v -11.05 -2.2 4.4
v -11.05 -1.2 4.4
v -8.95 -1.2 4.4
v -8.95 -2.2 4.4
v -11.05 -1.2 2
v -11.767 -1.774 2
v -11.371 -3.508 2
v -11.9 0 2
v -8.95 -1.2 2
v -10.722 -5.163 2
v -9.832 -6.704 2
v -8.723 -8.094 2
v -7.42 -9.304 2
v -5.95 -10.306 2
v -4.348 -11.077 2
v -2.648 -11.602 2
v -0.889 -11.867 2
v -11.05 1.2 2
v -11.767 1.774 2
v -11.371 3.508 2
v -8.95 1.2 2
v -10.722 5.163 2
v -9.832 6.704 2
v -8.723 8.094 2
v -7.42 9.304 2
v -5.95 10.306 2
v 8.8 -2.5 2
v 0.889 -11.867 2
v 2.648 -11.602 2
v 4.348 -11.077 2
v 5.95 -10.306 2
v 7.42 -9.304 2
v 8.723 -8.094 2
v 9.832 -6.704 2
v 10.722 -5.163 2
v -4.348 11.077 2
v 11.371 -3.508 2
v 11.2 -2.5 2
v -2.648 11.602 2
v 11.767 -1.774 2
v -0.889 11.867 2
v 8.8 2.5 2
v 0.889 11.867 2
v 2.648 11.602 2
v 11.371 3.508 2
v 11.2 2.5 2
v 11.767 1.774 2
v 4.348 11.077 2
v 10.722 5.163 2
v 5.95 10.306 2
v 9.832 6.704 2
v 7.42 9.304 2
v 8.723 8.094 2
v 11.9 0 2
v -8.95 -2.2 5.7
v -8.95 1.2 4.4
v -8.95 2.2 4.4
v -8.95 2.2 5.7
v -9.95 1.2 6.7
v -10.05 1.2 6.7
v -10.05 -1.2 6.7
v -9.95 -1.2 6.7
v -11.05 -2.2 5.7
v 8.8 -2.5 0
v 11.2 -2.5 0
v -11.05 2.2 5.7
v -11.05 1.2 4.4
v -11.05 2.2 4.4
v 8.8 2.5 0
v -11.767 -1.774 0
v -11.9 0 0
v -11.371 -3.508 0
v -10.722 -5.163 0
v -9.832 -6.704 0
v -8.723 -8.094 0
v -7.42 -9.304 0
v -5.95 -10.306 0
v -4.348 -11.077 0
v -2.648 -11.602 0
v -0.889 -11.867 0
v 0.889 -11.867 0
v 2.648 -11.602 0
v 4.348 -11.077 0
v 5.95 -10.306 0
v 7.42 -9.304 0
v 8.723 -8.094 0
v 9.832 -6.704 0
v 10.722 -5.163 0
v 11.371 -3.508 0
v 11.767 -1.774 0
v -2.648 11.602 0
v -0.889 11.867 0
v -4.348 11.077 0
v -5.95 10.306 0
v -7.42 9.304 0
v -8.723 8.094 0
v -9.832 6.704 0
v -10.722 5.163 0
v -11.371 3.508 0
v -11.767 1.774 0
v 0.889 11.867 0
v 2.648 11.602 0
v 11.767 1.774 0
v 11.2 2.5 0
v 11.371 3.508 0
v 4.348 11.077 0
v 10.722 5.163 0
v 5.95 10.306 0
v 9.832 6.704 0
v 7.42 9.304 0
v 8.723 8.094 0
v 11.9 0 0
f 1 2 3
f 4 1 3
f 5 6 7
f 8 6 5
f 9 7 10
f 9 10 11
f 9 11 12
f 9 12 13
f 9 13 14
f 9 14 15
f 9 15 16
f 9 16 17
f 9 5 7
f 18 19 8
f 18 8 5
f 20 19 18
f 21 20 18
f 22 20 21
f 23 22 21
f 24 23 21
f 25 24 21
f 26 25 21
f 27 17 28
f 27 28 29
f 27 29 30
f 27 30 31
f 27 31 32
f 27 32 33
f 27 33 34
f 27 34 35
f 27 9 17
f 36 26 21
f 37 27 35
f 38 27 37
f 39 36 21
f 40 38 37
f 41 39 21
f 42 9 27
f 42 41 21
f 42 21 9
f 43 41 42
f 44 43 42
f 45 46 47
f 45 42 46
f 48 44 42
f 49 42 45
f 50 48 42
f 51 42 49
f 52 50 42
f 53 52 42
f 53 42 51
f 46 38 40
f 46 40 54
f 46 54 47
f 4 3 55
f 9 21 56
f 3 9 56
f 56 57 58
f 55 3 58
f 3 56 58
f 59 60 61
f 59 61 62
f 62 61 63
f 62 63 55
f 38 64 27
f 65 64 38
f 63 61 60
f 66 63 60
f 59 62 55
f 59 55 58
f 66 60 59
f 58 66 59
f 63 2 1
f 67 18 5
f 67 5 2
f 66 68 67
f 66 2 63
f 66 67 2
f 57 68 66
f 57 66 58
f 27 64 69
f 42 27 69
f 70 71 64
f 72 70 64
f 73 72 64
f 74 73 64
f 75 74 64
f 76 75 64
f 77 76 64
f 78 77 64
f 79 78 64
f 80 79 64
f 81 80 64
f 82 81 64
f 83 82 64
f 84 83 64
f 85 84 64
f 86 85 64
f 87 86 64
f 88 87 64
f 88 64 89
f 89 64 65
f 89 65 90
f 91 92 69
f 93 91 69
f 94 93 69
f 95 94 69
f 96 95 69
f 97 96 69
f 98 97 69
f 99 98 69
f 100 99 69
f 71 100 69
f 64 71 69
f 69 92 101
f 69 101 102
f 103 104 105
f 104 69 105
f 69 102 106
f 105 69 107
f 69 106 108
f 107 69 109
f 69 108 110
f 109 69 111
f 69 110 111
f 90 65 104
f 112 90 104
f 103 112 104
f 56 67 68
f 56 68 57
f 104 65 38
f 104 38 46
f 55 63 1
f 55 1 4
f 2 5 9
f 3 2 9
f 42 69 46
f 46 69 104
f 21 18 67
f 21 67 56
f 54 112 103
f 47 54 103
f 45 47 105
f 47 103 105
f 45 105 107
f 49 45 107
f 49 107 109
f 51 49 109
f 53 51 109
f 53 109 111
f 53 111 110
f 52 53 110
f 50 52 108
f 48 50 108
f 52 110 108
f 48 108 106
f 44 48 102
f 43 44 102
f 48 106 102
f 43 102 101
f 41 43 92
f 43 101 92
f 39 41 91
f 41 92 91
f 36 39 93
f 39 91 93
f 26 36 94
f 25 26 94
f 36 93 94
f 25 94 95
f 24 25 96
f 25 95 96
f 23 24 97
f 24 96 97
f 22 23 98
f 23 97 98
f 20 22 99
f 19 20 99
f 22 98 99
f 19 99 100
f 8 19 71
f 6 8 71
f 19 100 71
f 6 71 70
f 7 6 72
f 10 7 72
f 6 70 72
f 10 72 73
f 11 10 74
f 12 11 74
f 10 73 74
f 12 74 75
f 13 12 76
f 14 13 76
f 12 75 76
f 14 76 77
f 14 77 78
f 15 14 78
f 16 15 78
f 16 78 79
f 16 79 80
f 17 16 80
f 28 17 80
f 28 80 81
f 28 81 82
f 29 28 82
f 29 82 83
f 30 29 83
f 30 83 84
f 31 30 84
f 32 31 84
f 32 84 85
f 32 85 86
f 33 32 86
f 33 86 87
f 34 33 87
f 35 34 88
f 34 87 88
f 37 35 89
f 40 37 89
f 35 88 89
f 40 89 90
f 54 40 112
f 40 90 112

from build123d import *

# Parameters (mm, degrees)
SKETCH1_R           = 11.9
SKETCH1_W           = 2.4
SKETCH1_H           = 5
BOSS_EXTRUDE2_DEPTH = 2
SKETCH2_W           = 2.1
SKETCH2_H           = 2.4
BOSS_EXTRUDE3_DEPTH = 4.7
SKETCH4_W           = 2.1
SKETCH4_H           = 2.3
BOSS_EXTRUDE5_DEPTH = 1
SKETCH5_W           = 2.1
SKETCH5_H           = 2.3
BOSS_EXTRUDE6_DEPTH = 1
CHAMFER1_SIZE       = 1


with BuildPart() as part:
    # Sketch1 → Boss-Extrude2 (new body)
    with BuildSketch(Plane.XY):
        Circle(SKETCH1_R)
        with Locations((10, 0)):
            Rectangle(SKETCH1_W, SKETCH1_H, mode=Mode.SUBTRACT)
    extrude(amount=BOSS_EXTRUDE2_DEPTH)

    # Sketch2 → Boss-Extrude3 (add)
    with BuildSketch(Plane.XY.offset(2)):
        with Locations((-10, 0)):
            Rectangle(SKETCH2_W, SKETCH2_H)
    extrude(amount=BOSS_EXTRUDE3_DEPTH)

    # Sketch4 → Boss-Extrude5 (add)
    with BuildSketch(Plane(origin=(0, 1.2, 0), x_dir=(1, 0, 0), z_dir=(0, 1, 0))):
        with Locations((-10, -5.55)):
            Rectangle(SKETCH4_W, SKETCH4_H)
    extrude(amount=BOSS_EXTRUDE5_DEPTH)

    # Sketch5 → Boss-Extrude6 (add)
    with BuildSketch(Plane.XZ.offset(1.2)):
        with Locations((-10, 5.55)):
            Rectangle(SKETCH5_W, SKETCH5_H)
    extrude(amount=BOSS_EXTRUDE6_DEPTH)

    # Chamfer1
    chamfer1_edges = [part.edges().sort_by_distance(p)[0] for p in [
        (-8.95, 0, 6.7),
        (-11.05, 0, 6.7),
        (-10, 2.2, 6.7),
        (-10, -2.2, 6.7),
    ]]
    chamfer(chamfer1_edges, length=CHAMFER1_SIZE)


solid = part.part
